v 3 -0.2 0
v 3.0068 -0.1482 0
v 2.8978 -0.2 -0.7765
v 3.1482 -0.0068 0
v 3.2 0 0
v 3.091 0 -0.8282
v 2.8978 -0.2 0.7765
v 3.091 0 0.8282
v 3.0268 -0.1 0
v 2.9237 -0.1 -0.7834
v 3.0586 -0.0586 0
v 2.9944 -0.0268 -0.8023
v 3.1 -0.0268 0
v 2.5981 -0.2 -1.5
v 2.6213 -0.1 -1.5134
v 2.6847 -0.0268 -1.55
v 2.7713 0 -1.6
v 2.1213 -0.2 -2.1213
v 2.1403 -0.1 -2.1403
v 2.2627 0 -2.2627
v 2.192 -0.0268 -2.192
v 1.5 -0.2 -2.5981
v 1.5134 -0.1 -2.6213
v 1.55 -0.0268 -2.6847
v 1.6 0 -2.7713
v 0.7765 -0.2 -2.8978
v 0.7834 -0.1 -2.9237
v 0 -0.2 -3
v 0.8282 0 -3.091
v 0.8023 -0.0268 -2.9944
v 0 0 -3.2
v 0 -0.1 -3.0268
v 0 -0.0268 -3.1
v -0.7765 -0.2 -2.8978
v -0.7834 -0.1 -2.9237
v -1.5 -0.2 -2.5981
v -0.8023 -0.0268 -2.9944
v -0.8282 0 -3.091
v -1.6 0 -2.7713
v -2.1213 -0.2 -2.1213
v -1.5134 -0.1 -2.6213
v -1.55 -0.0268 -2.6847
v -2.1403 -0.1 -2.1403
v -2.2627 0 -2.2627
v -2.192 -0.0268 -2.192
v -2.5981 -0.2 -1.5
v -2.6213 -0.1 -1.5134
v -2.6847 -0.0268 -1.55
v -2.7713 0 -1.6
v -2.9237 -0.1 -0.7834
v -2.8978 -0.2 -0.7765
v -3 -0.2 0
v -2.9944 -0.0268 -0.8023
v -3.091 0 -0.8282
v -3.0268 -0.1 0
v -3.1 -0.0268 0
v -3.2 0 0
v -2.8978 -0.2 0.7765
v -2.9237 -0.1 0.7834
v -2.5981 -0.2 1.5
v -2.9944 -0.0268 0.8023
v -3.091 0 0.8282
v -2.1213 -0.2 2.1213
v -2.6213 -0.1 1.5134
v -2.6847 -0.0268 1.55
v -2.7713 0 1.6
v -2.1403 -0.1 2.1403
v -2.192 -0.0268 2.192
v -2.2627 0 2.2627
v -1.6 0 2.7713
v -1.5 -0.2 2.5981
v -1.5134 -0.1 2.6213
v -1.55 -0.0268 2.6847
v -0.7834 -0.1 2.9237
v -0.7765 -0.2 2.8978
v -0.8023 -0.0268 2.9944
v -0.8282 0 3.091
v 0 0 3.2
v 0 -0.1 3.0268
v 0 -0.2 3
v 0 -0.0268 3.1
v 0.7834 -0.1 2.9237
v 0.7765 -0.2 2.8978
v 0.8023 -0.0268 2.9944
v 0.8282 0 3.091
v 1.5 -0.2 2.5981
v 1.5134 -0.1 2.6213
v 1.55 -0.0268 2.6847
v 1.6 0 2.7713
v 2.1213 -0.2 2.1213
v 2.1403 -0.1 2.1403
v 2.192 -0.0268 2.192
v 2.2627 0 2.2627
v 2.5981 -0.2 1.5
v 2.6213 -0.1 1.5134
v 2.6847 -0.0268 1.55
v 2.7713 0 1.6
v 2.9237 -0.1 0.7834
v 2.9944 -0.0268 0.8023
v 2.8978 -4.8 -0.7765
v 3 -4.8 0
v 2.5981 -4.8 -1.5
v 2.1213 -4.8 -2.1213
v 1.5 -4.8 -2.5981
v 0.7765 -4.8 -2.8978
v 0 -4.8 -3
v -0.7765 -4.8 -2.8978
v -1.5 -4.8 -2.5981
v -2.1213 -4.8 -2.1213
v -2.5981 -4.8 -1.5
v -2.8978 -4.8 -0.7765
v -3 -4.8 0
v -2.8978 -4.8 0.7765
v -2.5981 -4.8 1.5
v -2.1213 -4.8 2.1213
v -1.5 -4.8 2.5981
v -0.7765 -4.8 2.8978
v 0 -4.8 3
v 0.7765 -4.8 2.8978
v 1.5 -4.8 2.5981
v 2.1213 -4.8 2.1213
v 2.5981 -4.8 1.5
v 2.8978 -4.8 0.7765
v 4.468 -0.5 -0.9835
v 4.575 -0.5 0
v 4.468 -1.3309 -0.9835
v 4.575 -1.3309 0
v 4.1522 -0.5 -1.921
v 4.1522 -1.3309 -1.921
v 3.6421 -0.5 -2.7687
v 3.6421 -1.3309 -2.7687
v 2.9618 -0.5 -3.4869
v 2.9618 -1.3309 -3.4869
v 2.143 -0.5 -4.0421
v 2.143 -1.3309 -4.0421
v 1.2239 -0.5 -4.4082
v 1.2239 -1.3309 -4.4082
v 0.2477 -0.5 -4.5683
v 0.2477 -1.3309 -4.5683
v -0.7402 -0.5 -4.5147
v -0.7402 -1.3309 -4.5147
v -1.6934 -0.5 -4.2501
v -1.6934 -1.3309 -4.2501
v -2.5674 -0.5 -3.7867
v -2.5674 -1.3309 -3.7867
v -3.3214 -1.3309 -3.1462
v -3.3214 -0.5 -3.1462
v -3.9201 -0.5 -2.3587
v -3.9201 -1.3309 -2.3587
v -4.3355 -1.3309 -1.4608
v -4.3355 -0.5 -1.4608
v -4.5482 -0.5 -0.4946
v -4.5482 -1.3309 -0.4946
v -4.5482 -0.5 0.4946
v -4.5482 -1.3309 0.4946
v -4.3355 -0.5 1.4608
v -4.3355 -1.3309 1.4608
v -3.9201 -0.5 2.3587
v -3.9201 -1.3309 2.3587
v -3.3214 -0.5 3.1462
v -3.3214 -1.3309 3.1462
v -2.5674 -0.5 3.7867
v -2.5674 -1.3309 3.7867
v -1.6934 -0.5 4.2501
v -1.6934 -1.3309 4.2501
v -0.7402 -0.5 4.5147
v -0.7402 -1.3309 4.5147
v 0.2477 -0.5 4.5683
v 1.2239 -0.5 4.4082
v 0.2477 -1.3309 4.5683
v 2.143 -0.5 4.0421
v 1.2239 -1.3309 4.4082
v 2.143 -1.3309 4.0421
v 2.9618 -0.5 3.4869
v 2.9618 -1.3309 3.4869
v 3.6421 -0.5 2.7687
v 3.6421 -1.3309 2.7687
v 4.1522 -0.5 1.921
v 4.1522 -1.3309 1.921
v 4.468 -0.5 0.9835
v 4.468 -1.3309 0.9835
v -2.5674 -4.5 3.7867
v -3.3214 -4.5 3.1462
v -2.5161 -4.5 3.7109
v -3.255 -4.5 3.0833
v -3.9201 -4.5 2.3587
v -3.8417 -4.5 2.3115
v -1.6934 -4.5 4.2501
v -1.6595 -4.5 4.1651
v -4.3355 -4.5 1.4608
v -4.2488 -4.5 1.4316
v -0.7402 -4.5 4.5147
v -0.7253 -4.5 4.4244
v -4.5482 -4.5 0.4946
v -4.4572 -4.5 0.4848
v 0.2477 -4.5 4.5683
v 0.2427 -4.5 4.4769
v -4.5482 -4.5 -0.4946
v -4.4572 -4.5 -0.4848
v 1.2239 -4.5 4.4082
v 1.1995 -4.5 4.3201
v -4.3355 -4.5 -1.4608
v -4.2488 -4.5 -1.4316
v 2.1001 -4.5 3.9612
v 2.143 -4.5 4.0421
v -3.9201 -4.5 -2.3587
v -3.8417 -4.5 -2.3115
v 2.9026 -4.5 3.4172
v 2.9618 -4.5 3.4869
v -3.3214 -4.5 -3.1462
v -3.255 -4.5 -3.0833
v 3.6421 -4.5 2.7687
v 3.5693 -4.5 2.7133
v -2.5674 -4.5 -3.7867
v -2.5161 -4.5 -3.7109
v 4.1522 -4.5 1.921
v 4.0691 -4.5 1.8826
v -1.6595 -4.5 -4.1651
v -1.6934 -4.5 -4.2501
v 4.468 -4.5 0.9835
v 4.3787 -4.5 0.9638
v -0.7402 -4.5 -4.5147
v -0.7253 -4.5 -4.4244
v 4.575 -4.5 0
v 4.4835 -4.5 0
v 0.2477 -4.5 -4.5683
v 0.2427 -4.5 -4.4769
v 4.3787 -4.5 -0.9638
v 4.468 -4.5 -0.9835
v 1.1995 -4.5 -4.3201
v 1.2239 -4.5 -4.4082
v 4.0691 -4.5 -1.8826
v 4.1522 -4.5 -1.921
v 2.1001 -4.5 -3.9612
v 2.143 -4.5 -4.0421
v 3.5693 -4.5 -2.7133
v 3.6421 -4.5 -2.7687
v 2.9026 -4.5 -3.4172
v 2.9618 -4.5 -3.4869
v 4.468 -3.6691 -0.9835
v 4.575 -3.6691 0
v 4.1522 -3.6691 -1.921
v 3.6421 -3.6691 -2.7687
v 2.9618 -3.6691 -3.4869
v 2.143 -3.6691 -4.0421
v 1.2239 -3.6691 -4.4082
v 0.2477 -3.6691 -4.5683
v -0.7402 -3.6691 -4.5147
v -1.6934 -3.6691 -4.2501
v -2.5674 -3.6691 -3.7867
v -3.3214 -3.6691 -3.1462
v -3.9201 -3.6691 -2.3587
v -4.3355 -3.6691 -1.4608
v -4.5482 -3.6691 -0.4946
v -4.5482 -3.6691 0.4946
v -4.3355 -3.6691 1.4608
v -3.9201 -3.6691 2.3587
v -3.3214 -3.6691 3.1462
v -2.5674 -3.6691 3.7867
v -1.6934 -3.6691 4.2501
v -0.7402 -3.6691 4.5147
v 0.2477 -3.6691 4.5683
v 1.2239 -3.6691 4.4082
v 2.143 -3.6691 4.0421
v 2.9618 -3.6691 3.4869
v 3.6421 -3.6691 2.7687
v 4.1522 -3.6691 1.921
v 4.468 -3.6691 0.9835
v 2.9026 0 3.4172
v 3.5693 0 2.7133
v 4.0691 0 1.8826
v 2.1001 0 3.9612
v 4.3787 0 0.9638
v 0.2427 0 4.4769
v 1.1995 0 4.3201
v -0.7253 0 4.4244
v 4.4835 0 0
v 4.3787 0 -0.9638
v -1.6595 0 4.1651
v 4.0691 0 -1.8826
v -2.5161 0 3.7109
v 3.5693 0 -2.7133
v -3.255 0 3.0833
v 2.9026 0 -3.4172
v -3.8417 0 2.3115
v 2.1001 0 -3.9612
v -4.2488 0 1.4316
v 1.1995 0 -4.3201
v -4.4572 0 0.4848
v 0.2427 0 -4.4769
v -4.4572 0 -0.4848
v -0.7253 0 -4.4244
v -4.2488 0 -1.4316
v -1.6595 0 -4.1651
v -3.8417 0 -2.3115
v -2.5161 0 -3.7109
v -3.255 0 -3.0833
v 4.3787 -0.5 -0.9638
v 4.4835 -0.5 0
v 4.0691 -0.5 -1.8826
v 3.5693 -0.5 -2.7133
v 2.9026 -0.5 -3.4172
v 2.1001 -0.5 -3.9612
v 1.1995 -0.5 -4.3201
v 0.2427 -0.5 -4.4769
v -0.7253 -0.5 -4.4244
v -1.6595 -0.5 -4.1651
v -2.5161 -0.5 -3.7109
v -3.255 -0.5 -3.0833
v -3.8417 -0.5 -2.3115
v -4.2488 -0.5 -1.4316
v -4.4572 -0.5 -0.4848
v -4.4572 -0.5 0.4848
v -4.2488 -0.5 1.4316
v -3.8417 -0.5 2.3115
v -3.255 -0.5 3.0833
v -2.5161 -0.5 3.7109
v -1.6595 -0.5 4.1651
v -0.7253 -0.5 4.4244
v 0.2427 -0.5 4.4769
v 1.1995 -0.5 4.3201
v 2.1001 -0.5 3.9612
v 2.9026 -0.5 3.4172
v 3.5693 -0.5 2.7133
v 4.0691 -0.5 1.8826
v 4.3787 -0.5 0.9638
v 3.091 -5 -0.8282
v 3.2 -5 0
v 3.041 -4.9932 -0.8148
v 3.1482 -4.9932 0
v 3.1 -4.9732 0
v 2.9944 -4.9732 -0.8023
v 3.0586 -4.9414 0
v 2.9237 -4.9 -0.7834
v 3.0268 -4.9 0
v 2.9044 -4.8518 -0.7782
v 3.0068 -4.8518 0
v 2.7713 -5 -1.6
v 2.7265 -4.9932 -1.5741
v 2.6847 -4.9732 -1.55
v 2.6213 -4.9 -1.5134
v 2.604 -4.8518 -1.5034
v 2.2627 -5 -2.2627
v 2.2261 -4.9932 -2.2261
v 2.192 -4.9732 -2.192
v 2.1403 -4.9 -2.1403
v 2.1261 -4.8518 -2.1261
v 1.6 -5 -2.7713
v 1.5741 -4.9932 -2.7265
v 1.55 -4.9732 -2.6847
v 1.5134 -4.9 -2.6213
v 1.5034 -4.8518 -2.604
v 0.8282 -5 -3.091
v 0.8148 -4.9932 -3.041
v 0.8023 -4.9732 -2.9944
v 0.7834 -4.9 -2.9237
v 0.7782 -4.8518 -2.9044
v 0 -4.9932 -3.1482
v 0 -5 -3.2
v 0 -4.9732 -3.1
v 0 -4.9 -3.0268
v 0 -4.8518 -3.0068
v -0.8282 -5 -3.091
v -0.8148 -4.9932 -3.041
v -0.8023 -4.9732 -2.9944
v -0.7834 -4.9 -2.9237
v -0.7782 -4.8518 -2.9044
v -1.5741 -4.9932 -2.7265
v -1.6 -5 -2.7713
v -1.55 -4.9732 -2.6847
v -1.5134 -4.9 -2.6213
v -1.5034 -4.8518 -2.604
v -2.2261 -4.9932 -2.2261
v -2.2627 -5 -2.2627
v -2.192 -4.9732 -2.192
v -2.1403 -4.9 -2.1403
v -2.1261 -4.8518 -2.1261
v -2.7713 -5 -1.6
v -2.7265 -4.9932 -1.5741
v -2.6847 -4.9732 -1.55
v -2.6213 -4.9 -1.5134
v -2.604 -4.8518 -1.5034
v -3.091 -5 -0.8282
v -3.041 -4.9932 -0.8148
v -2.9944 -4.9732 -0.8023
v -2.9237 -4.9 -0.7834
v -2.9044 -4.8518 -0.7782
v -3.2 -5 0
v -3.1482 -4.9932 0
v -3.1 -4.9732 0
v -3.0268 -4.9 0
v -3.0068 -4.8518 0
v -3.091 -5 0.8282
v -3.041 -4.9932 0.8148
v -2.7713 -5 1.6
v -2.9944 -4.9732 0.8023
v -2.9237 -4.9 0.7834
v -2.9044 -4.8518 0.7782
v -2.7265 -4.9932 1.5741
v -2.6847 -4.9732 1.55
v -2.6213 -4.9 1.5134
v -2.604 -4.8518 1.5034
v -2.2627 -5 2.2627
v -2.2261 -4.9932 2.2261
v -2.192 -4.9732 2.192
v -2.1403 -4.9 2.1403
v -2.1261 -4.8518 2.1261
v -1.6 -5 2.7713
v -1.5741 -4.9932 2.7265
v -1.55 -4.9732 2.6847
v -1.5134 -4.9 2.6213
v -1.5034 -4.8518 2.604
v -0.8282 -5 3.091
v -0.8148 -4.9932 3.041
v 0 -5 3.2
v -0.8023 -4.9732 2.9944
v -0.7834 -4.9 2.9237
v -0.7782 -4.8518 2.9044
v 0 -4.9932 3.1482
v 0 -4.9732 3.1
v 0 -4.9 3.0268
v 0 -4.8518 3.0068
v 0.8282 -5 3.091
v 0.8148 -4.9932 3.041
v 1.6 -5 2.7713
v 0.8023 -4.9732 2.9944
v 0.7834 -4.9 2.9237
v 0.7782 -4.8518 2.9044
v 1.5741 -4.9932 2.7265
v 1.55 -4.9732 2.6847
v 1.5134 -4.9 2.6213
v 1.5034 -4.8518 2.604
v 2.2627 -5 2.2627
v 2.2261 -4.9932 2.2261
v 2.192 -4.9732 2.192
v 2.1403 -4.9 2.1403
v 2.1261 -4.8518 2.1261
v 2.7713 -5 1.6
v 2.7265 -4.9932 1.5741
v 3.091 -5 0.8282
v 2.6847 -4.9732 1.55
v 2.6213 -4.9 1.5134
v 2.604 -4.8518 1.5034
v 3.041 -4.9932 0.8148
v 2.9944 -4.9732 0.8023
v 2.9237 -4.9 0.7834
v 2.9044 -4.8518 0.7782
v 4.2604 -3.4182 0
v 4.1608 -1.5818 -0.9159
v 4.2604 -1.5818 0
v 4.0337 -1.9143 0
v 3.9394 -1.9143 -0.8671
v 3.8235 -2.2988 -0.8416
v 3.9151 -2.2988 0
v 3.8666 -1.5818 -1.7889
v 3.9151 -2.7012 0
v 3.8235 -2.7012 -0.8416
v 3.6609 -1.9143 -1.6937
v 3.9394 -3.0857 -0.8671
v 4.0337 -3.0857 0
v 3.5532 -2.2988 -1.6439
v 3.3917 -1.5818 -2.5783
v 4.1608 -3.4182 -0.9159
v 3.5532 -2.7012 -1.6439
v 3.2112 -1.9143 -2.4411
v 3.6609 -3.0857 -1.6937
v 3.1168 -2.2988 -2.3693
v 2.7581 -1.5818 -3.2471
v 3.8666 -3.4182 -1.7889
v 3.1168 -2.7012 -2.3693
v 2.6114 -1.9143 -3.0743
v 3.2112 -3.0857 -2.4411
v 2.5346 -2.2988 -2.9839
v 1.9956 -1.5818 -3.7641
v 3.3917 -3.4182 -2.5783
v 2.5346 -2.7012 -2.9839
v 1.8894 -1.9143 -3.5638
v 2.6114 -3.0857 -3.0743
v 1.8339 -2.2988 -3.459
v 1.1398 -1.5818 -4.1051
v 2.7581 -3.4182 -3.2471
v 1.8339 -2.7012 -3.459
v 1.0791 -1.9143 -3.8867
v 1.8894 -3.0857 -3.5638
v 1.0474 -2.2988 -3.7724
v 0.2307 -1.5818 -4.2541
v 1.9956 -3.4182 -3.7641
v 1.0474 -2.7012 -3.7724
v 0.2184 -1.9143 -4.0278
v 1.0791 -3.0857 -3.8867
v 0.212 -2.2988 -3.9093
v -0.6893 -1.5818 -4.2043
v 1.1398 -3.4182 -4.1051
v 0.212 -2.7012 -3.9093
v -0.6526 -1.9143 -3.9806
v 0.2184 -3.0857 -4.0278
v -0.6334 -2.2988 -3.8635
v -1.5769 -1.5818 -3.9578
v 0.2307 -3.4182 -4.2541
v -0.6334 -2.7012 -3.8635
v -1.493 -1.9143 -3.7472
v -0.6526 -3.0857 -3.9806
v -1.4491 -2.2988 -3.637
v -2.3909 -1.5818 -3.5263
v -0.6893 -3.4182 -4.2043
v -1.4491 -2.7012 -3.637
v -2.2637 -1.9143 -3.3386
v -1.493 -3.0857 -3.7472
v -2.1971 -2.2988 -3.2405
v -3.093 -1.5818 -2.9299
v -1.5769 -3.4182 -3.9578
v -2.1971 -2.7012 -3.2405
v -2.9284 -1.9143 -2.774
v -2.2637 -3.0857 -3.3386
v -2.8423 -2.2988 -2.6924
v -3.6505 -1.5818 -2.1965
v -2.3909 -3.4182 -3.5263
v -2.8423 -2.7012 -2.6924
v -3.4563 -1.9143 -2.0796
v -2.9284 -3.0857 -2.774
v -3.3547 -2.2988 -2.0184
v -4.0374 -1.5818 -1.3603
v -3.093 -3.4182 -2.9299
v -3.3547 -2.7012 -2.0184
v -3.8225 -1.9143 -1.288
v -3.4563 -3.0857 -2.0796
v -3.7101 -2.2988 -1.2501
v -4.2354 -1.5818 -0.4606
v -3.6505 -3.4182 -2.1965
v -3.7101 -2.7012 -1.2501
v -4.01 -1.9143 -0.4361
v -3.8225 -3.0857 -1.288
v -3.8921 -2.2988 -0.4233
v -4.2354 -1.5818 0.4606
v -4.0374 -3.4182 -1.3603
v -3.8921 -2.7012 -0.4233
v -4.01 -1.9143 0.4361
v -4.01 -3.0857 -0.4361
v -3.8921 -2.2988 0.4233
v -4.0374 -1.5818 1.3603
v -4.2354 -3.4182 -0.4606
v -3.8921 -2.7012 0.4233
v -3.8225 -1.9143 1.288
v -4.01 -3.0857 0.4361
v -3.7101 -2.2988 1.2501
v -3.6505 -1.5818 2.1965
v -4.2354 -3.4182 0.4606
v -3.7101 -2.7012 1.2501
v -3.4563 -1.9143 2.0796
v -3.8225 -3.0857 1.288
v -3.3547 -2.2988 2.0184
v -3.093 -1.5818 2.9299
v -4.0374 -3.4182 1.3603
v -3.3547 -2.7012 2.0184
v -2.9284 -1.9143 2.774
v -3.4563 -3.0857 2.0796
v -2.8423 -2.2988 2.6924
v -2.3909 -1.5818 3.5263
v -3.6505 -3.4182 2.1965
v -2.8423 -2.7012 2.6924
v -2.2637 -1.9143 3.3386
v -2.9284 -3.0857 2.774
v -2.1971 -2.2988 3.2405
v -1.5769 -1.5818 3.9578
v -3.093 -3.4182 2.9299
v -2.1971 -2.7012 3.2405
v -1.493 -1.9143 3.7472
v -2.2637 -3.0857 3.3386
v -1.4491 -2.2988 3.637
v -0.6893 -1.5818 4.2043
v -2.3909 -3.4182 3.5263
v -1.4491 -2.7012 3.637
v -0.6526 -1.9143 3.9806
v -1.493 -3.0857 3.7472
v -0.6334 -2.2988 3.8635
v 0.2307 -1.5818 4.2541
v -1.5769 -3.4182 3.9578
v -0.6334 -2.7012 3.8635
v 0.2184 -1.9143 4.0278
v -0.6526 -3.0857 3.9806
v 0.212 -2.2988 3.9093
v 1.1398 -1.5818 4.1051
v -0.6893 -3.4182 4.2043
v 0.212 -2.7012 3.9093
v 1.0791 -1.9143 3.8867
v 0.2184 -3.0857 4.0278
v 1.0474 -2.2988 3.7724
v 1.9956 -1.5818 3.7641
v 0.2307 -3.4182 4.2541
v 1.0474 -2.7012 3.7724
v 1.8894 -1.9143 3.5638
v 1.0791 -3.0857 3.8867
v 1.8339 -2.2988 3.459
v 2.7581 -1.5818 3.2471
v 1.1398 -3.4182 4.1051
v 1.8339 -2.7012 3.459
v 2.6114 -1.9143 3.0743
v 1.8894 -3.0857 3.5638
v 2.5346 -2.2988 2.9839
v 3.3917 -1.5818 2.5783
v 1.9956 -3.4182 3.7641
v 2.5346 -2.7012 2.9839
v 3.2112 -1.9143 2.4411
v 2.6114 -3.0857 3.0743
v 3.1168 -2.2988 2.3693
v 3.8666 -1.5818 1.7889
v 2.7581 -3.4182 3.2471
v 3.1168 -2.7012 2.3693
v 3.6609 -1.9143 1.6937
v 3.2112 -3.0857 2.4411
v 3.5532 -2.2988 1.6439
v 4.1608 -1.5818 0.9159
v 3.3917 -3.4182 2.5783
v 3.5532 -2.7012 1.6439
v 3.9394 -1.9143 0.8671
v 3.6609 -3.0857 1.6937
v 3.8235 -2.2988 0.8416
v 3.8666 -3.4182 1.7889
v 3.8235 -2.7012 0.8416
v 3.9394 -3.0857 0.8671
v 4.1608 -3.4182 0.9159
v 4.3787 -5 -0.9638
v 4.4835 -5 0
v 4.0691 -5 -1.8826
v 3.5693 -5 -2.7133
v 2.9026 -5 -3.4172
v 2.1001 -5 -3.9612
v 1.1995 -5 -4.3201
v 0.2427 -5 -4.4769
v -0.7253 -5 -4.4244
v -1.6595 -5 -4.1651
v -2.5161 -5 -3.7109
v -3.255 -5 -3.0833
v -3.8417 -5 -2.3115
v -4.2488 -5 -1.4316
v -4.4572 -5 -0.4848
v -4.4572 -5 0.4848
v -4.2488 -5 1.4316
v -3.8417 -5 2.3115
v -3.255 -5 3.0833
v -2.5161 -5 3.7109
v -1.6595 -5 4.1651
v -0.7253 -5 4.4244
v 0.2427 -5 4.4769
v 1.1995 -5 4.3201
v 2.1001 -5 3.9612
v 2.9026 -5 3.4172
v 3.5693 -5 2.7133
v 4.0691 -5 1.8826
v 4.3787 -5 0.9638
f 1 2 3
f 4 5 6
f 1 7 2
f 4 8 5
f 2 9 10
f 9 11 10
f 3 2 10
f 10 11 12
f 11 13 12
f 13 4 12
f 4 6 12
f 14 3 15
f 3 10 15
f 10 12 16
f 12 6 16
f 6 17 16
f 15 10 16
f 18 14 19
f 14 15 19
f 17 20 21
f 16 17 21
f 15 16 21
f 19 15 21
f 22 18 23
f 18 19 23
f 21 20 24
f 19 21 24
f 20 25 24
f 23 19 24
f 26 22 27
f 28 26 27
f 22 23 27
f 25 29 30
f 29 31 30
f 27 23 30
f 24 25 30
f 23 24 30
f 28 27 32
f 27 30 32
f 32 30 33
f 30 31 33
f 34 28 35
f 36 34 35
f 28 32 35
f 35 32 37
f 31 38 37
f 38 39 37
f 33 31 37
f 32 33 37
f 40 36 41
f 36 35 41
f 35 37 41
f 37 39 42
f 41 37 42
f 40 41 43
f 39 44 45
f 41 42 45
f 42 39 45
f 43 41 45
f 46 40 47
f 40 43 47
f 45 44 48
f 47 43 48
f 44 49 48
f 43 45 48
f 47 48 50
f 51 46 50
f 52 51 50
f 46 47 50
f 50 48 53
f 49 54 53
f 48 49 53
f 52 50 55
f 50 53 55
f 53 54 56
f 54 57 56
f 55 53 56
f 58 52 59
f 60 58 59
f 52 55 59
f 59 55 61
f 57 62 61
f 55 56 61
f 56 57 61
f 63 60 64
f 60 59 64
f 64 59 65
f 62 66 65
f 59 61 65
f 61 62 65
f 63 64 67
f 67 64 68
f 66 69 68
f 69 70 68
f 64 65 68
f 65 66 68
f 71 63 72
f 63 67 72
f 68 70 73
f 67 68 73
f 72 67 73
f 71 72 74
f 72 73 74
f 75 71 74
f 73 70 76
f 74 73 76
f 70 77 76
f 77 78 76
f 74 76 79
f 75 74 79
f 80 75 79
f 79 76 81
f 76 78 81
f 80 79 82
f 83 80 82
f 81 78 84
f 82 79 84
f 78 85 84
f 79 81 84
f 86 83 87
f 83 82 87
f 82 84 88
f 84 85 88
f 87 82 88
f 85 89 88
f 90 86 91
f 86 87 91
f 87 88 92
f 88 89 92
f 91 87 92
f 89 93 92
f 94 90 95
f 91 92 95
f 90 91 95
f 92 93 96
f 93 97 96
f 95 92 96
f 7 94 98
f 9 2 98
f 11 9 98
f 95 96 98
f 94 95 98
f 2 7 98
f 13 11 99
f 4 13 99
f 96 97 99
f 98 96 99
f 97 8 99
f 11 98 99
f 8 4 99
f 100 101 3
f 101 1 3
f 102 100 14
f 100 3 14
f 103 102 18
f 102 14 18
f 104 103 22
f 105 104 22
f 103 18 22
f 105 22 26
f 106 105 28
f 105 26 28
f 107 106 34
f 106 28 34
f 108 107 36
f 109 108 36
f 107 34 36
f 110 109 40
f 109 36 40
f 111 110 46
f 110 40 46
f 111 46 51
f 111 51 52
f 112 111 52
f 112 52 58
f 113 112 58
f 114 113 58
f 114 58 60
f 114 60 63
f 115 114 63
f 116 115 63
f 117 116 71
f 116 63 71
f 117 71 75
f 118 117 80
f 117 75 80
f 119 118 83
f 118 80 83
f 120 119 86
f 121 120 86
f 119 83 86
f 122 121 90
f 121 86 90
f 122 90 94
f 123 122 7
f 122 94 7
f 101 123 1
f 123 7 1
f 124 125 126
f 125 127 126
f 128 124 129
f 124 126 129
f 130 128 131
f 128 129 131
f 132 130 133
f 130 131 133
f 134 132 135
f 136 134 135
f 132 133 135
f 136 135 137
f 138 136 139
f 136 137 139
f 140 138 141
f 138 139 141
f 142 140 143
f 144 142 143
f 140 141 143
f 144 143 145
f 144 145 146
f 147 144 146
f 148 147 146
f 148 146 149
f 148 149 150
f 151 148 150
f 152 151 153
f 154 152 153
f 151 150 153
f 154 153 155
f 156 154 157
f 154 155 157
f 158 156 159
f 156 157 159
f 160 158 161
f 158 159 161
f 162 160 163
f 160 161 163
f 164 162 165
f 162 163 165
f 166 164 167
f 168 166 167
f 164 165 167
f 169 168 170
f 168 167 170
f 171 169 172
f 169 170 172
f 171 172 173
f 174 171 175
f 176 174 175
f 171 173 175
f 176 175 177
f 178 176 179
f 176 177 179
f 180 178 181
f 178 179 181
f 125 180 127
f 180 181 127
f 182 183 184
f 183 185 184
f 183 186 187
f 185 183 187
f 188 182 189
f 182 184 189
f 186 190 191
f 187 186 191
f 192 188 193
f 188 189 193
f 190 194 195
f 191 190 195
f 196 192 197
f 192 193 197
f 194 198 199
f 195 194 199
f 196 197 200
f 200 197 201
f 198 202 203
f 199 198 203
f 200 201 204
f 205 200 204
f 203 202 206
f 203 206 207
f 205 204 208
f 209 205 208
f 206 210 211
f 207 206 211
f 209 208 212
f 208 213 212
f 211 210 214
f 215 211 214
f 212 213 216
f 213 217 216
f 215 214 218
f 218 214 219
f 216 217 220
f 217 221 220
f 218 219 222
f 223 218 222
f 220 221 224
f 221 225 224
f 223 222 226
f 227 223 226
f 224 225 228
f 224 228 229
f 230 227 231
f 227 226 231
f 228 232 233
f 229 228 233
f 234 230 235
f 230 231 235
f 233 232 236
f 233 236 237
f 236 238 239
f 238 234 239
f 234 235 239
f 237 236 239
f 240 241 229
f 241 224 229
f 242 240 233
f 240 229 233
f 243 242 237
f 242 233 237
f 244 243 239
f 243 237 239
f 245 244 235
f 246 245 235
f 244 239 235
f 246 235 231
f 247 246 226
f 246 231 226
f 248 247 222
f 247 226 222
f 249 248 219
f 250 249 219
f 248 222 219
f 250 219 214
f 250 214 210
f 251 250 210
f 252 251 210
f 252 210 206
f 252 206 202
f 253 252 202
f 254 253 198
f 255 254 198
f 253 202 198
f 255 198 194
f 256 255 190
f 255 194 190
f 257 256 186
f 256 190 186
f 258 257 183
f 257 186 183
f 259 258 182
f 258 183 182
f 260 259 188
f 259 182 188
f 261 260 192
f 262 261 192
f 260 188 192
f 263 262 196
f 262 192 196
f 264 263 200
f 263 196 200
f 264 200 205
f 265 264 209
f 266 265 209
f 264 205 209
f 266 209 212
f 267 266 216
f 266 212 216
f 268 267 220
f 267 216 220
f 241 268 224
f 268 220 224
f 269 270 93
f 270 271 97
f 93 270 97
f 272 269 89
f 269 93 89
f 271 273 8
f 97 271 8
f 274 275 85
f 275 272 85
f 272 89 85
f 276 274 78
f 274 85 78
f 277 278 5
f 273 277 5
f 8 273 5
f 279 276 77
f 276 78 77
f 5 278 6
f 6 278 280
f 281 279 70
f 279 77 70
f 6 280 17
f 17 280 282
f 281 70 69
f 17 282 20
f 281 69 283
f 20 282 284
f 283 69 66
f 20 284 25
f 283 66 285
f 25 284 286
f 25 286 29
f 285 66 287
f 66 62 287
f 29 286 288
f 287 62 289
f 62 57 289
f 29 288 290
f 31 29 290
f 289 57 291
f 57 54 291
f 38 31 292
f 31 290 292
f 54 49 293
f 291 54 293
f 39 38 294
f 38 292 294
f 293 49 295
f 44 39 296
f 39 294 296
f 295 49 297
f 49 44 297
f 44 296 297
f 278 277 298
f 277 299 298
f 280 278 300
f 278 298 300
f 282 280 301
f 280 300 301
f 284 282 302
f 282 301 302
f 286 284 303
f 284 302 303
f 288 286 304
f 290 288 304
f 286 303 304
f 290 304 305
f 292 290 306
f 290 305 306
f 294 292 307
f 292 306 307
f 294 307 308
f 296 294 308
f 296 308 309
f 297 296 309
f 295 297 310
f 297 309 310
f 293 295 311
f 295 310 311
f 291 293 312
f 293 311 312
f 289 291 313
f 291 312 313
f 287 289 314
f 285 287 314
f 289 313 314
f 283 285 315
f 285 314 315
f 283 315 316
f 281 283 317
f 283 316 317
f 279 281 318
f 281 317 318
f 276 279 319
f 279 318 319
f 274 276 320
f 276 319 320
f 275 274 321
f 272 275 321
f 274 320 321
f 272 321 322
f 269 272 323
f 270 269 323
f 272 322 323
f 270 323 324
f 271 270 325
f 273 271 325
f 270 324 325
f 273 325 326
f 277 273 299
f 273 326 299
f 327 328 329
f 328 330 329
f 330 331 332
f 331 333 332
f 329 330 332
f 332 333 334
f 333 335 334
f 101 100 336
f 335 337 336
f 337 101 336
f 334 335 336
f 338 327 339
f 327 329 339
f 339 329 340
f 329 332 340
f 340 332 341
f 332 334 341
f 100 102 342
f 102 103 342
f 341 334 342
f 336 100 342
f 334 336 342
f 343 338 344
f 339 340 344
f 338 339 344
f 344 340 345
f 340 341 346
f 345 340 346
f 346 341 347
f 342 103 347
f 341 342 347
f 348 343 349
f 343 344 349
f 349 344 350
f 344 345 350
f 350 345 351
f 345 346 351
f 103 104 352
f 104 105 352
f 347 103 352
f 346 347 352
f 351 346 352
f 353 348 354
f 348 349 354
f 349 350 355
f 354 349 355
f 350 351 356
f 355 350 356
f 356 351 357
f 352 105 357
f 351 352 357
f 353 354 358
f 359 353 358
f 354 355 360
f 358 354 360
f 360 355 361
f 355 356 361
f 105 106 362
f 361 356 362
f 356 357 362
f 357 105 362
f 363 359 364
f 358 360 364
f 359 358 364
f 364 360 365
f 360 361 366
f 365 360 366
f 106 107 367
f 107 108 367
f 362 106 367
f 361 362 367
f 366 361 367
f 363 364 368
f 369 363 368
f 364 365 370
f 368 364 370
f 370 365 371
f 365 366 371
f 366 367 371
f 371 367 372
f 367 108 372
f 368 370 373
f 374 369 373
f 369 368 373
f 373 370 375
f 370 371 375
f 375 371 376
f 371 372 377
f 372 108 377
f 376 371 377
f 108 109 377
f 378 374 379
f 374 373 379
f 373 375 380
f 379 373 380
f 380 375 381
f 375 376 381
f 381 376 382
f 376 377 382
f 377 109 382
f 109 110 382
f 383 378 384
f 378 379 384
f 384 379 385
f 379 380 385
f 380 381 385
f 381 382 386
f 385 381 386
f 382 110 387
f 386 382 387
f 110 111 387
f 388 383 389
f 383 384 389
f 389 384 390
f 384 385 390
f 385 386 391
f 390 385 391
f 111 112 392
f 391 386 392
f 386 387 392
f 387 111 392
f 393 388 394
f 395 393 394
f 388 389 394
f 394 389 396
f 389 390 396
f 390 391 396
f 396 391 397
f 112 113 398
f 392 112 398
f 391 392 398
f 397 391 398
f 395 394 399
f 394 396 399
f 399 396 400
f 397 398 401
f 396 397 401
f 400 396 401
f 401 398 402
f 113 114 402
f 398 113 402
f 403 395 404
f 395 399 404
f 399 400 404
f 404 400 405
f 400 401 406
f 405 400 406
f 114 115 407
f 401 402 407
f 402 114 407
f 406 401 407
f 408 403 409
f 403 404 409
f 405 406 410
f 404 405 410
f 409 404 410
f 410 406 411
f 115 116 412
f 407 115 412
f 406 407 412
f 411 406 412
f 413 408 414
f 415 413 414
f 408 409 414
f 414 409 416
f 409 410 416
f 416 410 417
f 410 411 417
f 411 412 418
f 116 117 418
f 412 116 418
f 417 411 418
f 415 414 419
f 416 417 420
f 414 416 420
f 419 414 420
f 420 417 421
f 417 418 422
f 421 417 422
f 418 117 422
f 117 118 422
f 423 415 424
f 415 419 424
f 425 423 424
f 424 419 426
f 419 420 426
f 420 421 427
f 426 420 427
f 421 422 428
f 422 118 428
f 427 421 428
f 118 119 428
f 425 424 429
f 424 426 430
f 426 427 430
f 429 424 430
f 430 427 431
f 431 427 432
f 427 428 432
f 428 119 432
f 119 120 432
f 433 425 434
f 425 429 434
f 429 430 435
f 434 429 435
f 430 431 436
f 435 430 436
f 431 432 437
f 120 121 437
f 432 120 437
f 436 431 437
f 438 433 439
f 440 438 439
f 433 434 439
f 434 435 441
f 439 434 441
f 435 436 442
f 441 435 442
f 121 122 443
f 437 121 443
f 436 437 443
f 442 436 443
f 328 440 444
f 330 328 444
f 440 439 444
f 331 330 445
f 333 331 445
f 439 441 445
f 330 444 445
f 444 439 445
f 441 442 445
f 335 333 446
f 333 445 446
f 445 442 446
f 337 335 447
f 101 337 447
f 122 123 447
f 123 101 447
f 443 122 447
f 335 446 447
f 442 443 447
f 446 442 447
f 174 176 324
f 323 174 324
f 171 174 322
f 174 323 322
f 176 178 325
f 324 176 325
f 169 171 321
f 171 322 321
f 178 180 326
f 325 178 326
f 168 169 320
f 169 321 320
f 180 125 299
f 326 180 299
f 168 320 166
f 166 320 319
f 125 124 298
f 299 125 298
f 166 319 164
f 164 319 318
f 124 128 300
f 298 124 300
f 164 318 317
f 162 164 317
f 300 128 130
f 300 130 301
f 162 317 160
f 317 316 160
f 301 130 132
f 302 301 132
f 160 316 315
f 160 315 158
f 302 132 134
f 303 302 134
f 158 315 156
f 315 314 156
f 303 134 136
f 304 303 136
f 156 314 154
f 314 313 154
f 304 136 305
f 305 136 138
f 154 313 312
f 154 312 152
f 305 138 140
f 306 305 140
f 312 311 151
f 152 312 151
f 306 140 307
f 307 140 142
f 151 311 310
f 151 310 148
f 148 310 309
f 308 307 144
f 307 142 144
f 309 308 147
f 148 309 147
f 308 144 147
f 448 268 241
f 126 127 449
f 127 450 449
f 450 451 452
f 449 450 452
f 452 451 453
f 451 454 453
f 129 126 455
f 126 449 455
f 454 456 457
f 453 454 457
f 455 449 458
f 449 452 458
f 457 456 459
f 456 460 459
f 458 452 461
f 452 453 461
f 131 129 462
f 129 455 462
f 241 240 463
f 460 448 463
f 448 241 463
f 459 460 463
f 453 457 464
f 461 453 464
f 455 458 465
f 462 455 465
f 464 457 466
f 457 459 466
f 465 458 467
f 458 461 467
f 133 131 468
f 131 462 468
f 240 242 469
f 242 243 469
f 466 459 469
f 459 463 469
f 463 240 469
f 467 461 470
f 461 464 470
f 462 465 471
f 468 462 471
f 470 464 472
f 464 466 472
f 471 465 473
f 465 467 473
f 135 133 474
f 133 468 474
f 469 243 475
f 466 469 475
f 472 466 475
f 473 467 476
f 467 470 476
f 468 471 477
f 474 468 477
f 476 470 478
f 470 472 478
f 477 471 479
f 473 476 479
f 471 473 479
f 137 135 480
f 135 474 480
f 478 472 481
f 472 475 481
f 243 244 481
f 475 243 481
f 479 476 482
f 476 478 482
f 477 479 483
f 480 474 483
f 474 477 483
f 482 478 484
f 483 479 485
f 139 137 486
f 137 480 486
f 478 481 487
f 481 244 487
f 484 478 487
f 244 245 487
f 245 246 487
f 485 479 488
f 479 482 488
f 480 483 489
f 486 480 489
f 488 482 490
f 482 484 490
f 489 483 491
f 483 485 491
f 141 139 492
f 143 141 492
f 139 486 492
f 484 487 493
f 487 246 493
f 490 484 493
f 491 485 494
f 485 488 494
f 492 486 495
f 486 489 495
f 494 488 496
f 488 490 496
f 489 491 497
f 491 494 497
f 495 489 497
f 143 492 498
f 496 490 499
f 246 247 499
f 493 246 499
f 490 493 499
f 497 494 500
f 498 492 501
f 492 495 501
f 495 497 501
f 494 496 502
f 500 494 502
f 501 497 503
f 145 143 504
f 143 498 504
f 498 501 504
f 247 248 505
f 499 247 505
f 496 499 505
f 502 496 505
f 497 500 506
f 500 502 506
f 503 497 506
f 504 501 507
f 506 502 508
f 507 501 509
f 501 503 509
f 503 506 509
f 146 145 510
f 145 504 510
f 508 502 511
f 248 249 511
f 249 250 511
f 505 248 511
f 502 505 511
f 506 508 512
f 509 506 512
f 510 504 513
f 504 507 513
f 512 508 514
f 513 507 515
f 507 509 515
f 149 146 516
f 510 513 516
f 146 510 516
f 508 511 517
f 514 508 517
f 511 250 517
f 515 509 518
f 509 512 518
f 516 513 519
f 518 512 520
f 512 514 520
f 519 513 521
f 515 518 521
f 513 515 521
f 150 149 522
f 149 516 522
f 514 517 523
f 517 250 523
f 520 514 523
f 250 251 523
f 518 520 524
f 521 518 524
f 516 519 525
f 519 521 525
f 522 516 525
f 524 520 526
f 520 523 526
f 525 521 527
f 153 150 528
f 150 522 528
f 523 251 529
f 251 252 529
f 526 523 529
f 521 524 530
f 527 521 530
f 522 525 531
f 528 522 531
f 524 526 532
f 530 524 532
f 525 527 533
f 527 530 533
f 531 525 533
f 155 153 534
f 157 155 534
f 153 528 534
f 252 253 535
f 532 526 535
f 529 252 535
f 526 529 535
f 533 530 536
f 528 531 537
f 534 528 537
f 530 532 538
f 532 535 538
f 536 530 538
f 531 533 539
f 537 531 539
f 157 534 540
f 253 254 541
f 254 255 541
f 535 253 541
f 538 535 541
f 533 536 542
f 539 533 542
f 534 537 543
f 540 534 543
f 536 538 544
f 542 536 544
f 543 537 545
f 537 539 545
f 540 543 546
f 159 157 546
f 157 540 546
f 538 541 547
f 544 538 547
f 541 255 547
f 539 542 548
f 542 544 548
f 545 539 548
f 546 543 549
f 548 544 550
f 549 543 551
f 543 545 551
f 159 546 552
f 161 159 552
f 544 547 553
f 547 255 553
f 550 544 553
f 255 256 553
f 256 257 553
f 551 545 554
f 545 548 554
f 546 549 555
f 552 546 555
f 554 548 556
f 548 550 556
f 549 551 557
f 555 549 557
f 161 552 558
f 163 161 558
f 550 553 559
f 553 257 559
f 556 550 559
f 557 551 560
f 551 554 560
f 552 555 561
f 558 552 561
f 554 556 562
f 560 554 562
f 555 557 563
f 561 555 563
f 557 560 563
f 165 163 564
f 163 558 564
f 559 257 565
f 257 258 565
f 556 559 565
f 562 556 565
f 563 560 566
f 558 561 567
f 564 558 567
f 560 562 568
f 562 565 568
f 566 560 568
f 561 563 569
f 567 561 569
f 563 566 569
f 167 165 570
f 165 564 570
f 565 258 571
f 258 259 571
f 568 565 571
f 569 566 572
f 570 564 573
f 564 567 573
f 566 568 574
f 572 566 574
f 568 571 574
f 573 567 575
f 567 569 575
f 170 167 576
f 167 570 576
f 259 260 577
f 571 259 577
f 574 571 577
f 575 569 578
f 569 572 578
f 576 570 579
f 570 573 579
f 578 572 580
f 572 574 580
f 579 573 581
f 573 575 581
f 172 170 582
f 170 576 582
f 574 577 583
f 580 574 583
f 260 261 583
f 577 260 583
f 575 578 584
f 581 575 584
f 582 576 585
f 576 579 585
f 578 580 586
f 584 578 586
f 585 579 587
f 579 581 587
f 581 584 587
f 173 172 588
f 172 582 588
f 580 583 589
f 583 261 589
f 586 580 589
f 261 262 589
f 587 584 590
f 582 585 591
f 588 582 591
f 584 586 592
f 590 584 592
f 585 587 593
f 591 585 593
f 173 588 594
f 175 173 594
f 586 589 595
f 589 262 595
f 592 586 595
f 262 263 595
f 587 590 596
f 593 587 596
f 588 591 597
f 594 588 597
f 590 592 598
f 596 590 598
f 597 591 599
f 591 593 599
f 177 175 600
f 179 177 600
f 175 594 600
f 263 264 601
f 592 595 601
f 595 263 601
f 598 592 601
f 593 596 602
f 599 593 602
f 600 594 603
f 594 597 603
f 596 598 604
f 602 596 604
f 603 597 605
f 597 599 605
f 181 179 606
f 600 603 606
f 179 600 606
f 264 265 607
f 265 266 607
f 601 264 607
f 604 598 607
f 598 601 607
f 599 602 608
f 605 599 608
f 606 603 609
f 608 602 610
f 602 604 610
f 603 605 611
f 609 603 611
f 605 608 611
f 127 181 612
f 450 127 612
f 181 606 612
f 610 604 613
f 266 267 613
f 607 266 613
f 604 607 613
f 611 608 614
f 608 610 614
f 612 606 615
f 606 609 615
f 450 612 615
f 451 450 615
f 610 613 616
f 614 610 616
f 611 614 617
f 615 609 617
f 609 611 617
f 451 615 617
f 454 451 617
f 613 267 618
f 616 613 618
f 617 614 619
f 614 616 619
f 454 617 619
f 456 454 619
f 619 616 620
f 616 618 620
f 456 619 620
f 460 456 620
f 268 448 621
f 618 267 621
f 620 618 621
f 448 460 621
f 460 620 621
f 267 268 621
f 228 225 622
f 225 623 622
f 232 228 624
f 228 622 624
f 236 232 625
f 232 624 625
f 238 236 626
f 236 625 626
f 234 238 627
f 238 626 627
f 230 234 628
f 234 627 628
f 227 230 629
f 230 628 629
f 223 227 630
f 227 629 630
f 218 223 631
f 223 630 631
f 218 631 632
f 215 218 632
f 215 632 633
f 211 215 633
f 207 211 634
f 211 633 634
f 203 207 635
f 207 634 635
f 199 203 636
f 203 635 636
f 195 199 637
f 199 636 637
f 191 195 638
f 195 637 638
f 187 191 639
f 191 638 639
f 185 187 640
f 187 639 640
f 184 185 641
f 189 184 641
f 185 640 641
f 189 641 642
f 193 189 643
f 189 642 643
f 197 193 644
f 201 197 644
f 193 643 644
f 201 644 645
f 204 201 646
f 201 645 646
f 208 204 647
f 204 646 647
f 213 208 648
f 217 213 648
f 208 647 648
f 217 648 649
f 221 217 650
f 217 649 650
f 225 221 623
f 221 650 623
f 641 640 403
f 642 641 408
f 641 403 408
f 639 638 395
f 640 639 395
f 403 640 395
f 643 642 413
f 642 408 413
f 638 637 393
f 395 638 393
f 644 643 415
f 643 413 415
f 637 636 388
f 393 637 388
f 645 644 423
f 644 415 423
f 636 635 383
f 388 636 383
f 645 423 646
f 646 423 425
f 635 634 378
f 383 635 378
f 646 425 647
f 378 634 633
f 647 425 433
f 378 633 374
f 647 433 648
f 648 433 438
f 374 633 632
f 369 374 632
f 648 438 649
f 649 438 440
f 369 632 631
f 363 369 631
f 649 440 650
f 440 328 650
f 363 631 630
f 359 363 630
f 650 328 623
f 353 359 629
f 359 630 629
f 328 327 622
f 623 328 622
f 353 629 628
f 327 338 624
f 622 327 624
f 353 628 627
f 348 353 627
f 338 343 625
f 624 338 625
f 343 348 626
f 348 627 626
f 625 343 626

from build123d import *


with BuildPart() as part:
    # Sketch1 → Revolve1 (revolve)
    with BuildSketch(Plane(origin=(0, 0, 0), x_dir=(-1, 0, 0), z_dir=(0, 0, -1))):
        with BuildLine():
            Line((-4.575, -0.5), (-4.575, -1.330865705))
            ThreePointArc((-4.575, -1.330865705), (-3.9, -2.5), (-4.575, -3.669134295))
            Line((-4.575, -3.669134295), (-4.575, -4.5))
            Line((-4.575, -4.5), (-4.4835, -4.5))
            Line((-4.4835, -4.5), (-4.4835, -5))
            Line((-4.4835, -5), (-3.2, -5))
            ThreePointArc((-3.2, -5), (-3.058578644, -4.941421356), (-3, -4.8))
            Line((-3, -4.8), (-3, -0.2))
            ThreePointArc((-3, -0.2), (-3.058578644, -0.058578644), (-3.2, 0))
            Line((-3.2, 0), (-4.4835, 0))
            Line((-4.4835, 0), (-4.4835, -0.5))
            Line((-4.4835, -0.5), (-4.575, -0.5))
        make_face()
    revolve(axis=Axis((0, -5.003495744, 0), (0, 1, 0)))


solid = part.part
